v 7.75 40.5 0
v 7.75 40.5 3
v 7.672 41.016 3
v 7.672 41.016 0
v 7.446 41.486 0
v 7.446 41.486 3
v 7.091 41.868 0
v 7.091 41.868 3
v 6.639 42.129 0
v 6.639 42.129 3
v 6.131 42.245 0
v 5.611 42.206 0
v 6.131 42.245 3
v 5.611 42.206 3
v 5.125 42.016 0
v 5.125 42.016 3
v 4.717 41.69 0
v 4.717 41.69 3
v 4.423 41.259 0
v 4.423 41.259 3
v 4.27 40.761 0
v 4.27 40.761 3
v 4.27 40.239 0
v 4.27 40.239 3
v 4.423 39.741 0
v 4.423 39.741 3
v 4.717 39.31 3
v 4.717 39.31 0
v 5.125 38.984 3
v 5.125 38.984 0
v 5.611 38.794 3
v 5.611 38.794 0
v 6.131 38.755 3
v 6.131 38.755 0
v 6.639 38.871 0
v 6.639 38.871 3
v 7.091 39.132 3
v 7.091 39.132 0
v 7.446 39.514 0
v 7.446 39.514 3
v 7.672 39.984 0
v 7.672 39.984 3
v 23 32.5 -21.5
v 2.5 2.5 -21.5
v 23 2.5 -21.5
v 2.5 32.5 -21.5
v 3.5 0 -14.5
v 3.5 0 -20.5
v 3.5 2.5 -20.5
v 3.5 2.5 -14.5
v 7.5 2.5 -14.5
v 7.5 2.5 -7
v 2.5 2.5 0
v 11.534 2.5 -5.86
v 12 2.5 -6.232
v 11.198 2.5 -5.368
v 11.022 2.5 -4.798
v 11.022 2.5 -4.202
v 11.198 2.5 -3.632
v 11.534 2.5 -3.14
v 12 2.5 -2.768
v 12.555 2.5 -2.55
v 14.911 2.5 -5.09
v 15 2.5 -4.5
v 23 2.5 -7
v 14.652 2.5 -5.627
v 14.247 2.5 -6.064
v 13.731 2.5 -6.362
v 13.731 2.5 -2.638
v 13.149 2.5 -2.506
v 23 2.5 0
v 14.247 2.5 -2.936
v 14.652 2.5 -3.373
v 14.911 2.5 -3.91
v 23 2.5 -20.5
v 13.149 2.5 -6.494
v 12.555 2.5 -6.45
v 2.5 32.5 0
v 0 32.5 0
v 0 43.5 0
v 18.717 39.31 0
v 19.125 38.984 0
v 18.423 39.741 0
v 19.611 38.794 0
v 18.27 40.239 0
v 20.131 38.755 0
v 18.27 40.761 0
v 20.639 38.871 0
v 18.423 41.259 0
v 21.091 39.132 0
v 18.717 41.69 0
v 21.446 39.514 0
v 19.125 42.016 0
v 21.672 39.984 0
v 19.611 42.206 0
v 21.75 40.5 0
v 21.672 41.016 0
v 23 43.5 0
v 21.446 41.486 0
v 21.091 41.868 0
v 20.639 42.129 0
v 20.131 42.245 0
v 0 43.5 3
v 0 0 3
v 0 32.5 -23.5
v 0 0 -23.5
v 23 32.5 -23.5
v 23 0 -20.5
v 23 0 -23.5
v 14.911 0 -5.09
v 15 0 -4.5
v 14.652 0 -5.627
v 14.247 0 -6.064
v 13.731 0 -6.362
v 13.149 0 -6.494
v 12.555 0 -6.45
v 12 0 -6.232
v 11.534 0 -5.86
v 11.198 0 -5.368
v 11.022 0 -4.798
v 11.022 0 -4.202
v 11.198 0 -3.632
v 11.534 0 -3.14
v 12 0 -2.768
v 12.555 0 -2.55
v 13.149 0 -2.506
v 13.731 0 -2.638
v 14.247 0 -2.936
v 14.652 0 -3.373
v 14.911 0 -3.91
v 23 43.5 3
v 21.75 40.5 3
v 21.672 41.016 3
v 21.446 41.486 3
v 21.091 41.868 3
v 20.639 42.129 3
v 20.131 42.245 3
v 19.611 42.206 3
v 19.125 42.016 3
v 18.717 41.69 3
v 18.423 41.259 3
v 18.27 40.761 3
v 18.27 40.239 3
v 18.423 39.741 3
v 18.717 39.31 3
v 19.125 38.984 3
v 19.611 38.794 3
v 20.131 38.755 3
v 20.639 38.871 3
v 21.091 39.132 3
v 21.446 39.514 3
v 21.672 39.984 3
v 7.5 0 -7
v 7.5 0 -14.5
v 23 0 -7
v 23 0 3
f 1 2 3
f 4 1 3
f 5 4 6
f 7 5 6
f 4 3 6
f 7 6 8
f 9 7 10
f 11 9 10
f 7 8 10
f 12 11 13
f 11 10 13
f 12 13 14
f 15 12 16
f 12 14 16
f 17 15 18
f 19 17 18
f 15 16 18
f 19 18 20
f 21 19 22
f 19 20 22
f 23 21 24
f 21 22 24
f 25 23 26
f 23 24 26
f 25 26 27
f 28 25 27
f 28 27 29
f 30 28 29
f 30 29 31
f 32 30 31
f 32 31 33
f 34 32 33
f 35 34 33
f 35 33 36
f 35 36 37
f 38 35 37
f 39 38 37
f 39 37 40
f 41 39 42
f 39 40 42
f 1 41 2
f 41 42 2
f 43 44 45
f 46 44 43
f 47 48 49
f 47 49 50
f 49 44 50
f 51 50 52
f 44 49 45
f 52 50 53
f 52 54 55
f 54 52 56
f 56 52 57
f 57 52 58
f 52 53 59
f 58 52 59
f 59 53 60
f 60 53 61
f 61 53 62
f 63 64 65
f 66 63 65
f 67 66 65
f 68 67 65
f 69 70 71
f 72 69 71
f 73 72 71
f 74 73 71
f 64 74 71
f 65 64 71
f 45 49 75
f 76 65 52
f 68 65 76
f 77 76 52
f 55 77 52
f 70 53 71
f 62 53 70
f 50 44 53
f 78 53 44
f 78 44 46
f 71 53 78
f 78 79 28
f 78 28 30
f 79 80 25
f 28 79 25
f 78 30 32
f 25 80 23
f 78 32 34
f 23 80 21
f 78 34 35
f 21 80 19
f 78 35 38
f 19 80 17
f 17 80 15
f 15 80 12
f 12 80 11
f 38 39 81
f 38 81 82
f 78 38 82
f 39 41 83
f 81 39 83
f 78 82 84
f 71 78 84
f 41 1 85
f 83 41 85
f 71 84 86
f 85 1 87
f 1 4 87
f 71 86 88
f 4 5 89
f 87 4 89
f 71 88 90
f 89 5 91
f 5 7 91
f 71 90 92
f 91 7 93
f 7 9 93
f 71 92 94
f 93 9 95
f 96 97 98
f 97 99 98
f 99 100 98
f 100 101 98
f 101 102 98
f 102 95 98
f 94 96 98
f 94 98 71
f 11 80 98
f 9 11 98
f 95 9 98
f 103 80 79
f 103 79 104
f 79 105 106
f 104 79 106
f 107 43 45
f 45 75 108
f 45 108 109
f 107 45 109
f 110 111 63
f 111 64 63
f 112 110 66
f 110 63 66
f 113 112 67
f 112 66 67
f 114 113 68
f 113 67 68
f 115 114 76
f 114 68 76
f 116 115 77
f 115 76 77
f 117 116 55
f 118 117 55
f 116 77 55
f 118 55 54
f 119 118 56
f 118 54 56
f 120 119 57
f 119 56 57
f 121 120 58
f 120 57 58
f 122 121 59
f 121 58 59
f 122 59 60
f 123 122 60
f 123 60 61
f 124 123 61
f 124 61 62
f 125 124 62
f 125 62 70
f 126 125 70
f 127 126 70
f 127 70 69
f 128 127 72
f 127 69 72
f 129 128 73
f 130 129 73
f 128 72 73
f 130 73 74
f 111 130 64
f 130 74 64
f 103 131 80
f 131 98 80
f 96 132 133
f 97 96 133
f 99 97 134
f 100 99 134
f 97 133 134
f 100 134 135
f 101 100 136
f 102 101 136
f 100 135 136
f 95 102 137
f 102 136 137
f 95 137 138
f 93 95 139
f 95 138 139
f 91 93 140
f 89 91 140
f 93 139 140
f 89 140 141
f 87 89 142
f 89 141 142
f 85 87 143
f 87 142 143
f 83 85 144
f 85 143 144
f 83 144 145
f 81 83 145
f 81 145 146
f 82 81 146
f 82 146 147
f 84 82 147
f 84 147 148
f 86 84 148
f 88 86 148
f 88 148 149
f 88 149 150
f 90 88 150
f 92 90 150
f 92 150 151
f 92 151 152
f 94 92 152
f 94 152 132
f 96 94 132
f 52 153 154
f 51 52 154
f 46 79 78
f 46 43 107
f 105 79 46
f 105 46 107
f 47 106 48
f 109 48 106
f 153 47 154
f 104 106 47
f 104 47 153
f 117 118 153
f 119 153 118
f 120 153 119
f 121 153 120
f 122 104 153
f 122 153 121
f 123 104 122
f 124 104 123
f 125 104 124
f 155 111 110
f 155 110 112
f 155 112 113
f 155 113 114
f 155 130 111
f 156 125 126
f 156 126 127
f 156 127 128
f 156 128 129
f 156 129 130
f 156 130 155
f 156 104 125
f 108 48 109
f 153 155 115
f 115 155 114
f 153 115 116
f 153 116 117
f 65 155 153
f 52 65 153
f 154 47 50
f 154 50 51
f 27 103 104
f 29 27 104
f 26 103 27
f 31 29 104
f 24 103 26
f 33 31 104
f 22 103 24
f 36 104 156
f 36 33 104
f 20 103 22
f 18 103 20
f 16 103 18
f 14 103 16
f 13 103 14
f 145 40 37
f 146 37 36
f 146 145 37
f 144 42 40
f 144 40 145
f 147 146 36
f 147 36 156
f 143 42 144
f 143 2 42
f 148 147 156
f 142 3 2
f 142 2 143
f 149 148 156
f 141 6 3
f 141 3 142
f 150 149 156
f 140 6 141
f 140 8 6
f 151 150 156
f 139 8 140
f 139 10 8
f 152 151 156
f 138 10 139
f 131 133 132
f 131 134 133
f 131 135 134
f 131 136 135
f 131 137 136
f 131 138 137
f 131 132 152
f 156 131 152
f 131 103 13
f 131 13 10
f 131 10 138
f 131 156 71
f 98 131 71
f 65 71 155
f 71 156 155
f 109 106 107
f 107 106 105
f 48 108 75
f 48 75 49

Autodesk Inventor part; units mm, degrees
ref_plane "YZ Plane" through (0, 0, 0) normal (1, 0, 0) x (0, 1, 0)
ref_plane "XZ Plane" through (0, 0, 0) normal (0, 1, 0) x (-1, 0, 0)
ref_plane "XY Plane" through (0, 0, 0) normal (0, 0, 1) x (1, 0, 0)
sketch "Sketch1" plane through (0, 0, 0) normal (0, 0, 1) x (1, 0, 0)
  line L0 (0, 0) -> (23, 0)
  line L1 (23, 0) -> (23, 43.5)
  line L2 (23, 43.5) -> (0, 43.5)
  line L3 (0, 43.5) -> (0, 0)
  dimension "d0" = 23
  dimension "d1" = 43.5
extrude "Extrusion1" add sketch "Sketch1" along normal blind 3
sketch "Sketch6" plane through (0, 0, 0) normal (0, 0, -1) x (-1, 0, 0)
  line L0 (0, 0) -> (-2.5, 0)
  line L1 (-2.5, 0) -> (-2.5, 32.5)
  line L2 (-2.5, 32.5) -> (0, 32.5)
  line L3 (0, 32.5) -> (0, 0)
  dimension "d17" = 2.5
  dimension "d18" = 32.5
extrude "Extrusion5" add sketch "Sketch6" along normal blind 23.5
sketch "Sketch7" plane through (2.5, 0, 0) normal (1, 0, 0) x (0, 0, -1)
  line L0 (23.5, 0) -> (23.5, 32.5) projected
  line L1 (0, 32.5) -> (23.5, 32.5) projected
  line L2 (23.5, 0) -> (21.5, 0)
  line L3 (21.5, 0) -> (21.5, 32.5)
  line L4 (21.5, 32.5) -> (23.5, 32.5)
  line L5 (23.5, 32.5) -> (23.5, 0)
  point P0 (0, 0)
  dimension "d21" = 2
extrude "Extrusion6" add sketch "Sketch7" along normal blind 20.5
sketch "Sketch8" plane through (0, 0, 3) normal (0, -1, 0) x (1, 0, 0)
  line L0 (2.5, -3) -> (23, -3) projected
  line L1 (23, -3) -> (23, 0) projected
  line L2 (0, 0) -> (23, 0) projected
  line L3 (0, 0) -> (0, -26.5) projected
  line L4 (0, -26.5) -> (23, -26.5) projected
  line L5 (23, -24.5) -> (23, -26.5) projected
  line L6 (2.5, -24.5) -> (23, -24.5) projected
  line L7 (2.5, -3) -> (2.5, -24.5) projected
  line L8 (23, -3) -> (23, -10)
  line L9 (23, -10) -> (7.5, -10)
  line L10 (7.5, -10) -> (7.5, -23.5)
  line L11 (7.5, -23.5) -> (23, -23.5)
  line L12 (23, -23.5) -> (23, -24.5)
  point P0 (0, -3)
  dimension "d24" = 7
  dimension "d25" = 1
  dimension "d26" = 5
extrude "Extrusion7" add sketch "Sketch8" against normal blind 2.5 contours L0 L8 L9 L10 L11 L12 L6 L7
sketch "Sketch10" plane through (0, 2.5, 3) normal (0, 1, 0) x (1, 0, 0)
  circle A0 centre (13, 7.5) radius 2
  line L0 (23, 3) -> (23, 10) projected
  line L1 (23, 3) -> (0, 3) projected
  dimension "d35" = 10
  dimension "d36" = 4.5
  dimension "d37" = 4
extrude "Extrusion9" cut sketch "Sketch10" against normal blind 2.5
sketch "Sketch11" plane through (0, 0, 3) normal (0, 0, 1) x (1, 0, 0)
  circle A0 centre (6, 40.5) radius 1.75
  circle A1 centre (20, 40.5) radius 1.75
  line L0 (0, 43.5) -> (0, 0) projected
  line L1 (23, 0) -> (23, 43.5) projected
  line L2 (0, 0) -> (23, 0) projected
  dimension "d40" = 3.5
  dimension "d41" = 3.5
  dimension "d42" = 14
  dimension "d44" = 3
  dimension "d45" = 40.5
extrude "Extrusion10" cut sketch "Sketch11" against normal blind 3
sketch "Sketch12" plane through (0, 0, 3) normal (0, -1, 0) x (1, 0, 0)
  line L0 (23, -23.5) -> (7.5, -23.5) projected
  line L1 (7.5, -23.5) -> (3.5, -23.5)
  line L2 (3.5, -23.5) -> (3.5, -17.5)
  line L3 (3.5, -17.5) -> (7.5, -17.5)
  line L4 (7.5, -17.5) -> (7.5, -23.5)
  point P0 (0, -3)
  dimension "d48" = 4
  dimension "d49" = 6
extrude "Extrusion11" cut sketch "Sketch12" against normal blind 2.5
equation "\"d41\" = d40"
properties part number "SOPORTE_HOTEND"
